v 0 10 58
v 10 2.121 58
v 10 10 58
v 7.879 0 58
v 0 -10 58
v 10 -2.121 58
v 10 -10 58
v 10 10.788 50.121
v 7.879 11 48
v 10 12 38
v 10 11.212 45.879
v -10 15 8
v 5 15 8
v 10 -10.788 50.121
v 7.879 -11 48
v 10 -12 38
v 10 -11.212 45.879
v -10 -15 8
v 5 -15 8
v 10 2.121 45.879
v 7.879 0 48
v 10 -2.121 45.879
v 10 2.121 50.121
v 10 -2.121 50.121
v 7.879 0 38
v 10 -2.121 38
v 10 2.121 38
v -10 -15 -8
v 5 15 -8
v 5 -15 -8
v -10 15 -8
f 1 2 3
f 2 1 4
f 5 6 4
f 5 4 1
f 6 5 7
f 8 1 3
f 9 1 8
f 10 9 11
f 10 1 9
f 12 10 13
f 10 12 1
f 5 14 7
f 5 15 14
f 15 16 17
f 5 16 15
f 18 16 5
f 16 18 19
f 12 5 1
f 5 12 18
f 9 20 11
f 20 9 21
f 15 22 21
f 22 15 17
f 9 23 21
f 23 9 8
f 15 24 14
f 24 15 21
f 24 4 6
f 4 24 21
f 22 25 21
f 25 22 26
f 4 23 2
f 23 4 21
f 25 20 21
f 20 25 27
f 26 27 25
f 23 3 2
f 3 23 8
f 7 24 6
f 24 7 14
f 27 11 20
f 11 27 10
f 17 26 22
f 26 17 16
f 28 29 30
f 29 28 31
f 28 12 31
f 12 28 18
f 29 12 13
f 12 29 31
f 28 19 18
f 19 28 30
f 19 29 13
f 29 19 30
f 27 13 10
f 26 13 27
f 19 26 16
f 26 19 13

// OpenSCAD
// file: auxiliery_models.scad
$fn = 40;

// usefull modules

//cloning mirror
module mirror2(v) {
    children();
    mirror(v) children();
}


// hole for vertical printing (no suppurt)
module smart_hole(d = 10, h = 10, center = true, bridging = true) {
    difference() {
        union() {
            rotate([0,90,0])
                cylinder(d = d, h = h, center = center);
            translate([0,0,sqrt(2*d*d)/4])
                rotate([45,0,0])
                cube([h,d/2,d/2], center = center);
        }
        if(bridging)
            translate([0,0,d])
                cube([h+1,d,d], center = center);
    }
}

// for angled screw head 
// sh_d = screw head diameter
module smart_screw_hole(d = 3.2, h = 20, sh_d = 7, sh_h = 4, center = true, bridging = true) {
    smart_hole(d=d, h=h, center = center, bridging = bridging);
    translate([-h/2,0,])
        rotate([0,90,0])
        rotate_extrude(angle = 360)
        polygon([[d/2, sh_h],[ sh_d/2,0], [d/2,0], [d/2 - 2, 0], [d/2 - 2, sh_h]]);
}

function pulley_d_calc(teeth) = (2*((teeth*2)/(3.14159265*2)-0.254));

module pulley(teeth = 40, h = 12, sides = 0) {
    additional_tooth_width = 0.2; //mm
    additional_tooth_depth = 0.2; //mm

    
    pulley_OD = pulley_d_calc(teeth);
    tooth_depth = 0.764;
    tooth_width = 1.494;
    
	tooth_distance_from_centre = sqrt( pow(pulley_OD/2,2) - pow((tooth_width+additional_tooth_width)/2,2));
	tooth_width_scale = (tooth_width + additional_tooth_width ) / tooth_width;
	tooth_depth_scale = ((tooth_depth + additional_tooth_depth ) / tooth_depth) ;

    module GT2_2mm() {
        linear_extrude(height=h+2) polygon([[0.747183,-0.5],[0.747183,0],[0.647876,0.037218],
        [0.598311,0.130528],[0.578556,0.238423],[0.547158,0.343077],[0.504649,0.443762],[0.451556,0.53975],
        [0.358229,0.636924],[0.2484,0.707276],[0.127259,0.750044],[0,0.76447],[-0.127259,0.750044],
        [-0.2484,0.707276],[-0.358229,0.636924],[-0.451556,0.53975],[-0.504797,0.443762],[-0.547291,0.343077],
        [-0.578605,0.238423],[-0.598311,0.130528],[-0.648009,0.037218],[-0.747183,0],[-0.747183,-0.5]]);
    }   

	difference() {	
		rotate ([0,0,360/(teeth*4)]) 
		cylinder(r=pulley_OD/2,h=h, $fn=teeth*4);
	
		//teeth - cut out of shaft
		
		for(i=[1:teeth]) 
        rotate([0,0,i*(360/teeth)]) 
        translate([0,-tooth_distance_from_centre,-1]) 
        scale ([ tooth_width_scale , tooth_depth_scale , 1 ]) 
        {
         GT2_2mm();
        }
	}	
    if ( sides > 0 ) {
        translate ([0,0, h - sides]) 
        rotate_extrude($fn=teeth*4)  
        polygon([[0,0],[pulley_OD/2,0],[pulley_OD/2 + sides , sides],[0 , sides],[0,0]]);
    }
		
    if ( sides > 0 ) {
        translate ([0,0,0 ]) 
        rotate_extrude($fn=teeth*4)  
        polygon([[0,0],[pulley_OD/2 + sides,0],[pulley_OD/2 , sides],[0 , sides],[0,0]]);
    } 
}

module belt_connector_round(teeth = 40, h = 8, belt_thick = 1, wall_thick = 5, wall_ang = 90, outer_d = 40) {
    pulley(teeth = 40, h = 8);
    
    wall_inner_r = pulley_d_calc(teeth) / 2 + belt_thick;
    
    if(outer_d / 2 - wall_inner_r > wall_thick) 
    {  
        echo("here");
        wall_center_r = (pulley_d_calc(teeth) + outer_d / 2 - wall_inner_r) / 2 + belt_thick;
        
        rotate_extrude(angle = wall_ang)
        translate([wall_center_r,h / 2,0])
        square([outer_d / 2 - wall_inner_r, h], center = true);
    } else {  
        wall_center_r = (pulley_d_calc(teeth) + wall_thick) / 2 + belt_thick;
        
        rotate_extrude(angle = wall_ang)
        translate([wall_center_r,h / 2,0])
        square([wall_thick, h], center = true);
    }
}

module motor_s_cutout(screw_l = 3) {
	//todo get dimension
	motor_w = 12;
	motor_d = 10;
	gear_h = 8; // get real
	motor_h = 15.2 + gear_h + 5;

	shaft_d = 4;
	shaft_l = screw_l;
	
	//ssrews
	screws_cnt = 2;
	screw_offset = 9 / 2;  
	screw_d = 1.6;
	screw_top_d = 2.4;
	screw_top_off = (screw_d - screw_top_d) / 2;

	translate([0, 0, - motor_h / 2])
		cube([motor_w, motor_d, motor_h], center = true);
	translate([0, 0, + shaft_l / 2])
		cylinder(d = shaft_d, h = shaft_l, center = true);
	mirror2([1,0,0])
		translate([screw_offset, 0, + screw_l / 2]) {
			cylinder(d = screw_d, h = screw_l, center = true);

			rotate_extrude()
				polygon([[screw_d / 2	 , screw_l / 2],
						 [screw_top_d / 2, screw_l / 2],
						 [screw_d / 2	 , screw_l / 2 + screw_top_off]]);
			}
}

motor_s_cutout();

module motor_m_cutout() {

}

module motor_l_cutout() {

}

/*
difference() {
    union() {
        pulley(teeth = 20, h = 10, sides = 2);
        translate([0,0,-3])
            cylinder(h = 6, d = pulley_d_calc(20) + 4, center = true, $fn = 20 * 4);
        translate([0,0,10.5])
            cylinder(h = 1, d = pulley_d_calc(20) + 4, center = true, $fn = 20 * 4);
    }
    
    cylinder(d = 4.5, h = 30, center = true);
    translate([0, 4.2, -3])
        cube([6, 3, 7], center = true);
    translate([0, 10, -3])
        rotate([90,00,0])
            cylinder(h = 20, d = 3.2, center = true);
}
*/

/*translate([0, 0, 0])
    cube([40,40,5], center = true);
rotate([0,0,135])
    belt_connector_round();
*/
/*
difference() {
    union() {
        translate([-200/2, 0, -2.5])
            cube([200,30,5], center = true);
        translate([0,0,-2.5])
            cylinder(h = 5, d = 30, center = true);
        translate([-200,0,-2.5])
            cylinder(h = 5, d = 30, center = true);
        rotate([0,0,135])
            belt_connector_round();
    }
   
    cylinder(h = 20, d = 8, center = true);
    translate([-50, 0, -2.5])
        cylinder(h = 20, d = 8, center = true);
    translate([-100, 0, -2.5])
        cylinder(h = 20, d = 8, center = true);
    translate([-150, 0, -2.5])
        cylinder(h = 20, d = 8, center = true);
    translate([-200, 0, -2.5])
        cylinder(h = 20, d = 8, center = true);
}*/
/*
//smart_hole();
difference() {
    cube([30,60,60], center = true);
    smart_screw_hole(d = 30, h = 30, sh_d = 40, sh_h = 5);
    
}*/
// main file
use <auxiliery_models.scad> 

nut_M4_w = 7;
nut_M4_h = 3;
nut_M4_d = 8;

module body() {
	

}

module finger() {
	finger_h = 50;
	finger_d = 20;
	finger_w = 30;
	
	base_h = 16;
	base_d = 15;

	top_h = 20;
	top_d = 10;
	top_w = 20;
	
	grip_cut_side = 3;

	//modules
	module base_cutout() {
		translate([finger_d / 2, 0, -base_h / 2])
			rotate([90,-90,0])
			linear_extrude(50, center = true)
			polygon([[0,-1], [0, finger_d - base_d], 
					[base_h, finger_d - base_d], 
					[base_h + finger_h - top_h, 0],
					[base_h + finger_h - top_h, -1]]);

	}

	module top_cutouts() {
		// side cuts
		mirror2([0,1,0])
			translate([0, finger_w/2, finger_h + base_h / 2])
			rotate([90,-90,90])
			linear_extrude(50, center = true)
			polygon([[0,-1],
					[0, (finger_w - top_w) / 2], 
					[0 - finger_h, 0], 
					[0 - finger_h, -1]]
					);
		// back cut
		translate([-finger_d/2, 0, finger_h + base_h / 2])
			rotate([90,-90,-180])
			linear_extrude(50, center = true)
			polygon([[0,-1],
					[0, finger_d - top_d], 
					[0 - finger_h, 0], 
					[0 - finger_h, -1]]
					);
	}
	
	module grip_cutouts() {
		translate([finger_d /2, 0, finger_h + base_h / 2 - (top_w / 2)]) {
			rotate([0,45,0])
				cube([grip_cut_side, finger_w, grip_cut_side], center = true);
			rotate([0,0,45])
				cube([grip_cut_side, grip_cut_side, top_h], center = true);
		}
	}

	// model itself
	difference() {
		//baiic cube
		translate([0, 0, finger_h /2])
			cube([finger_d, finger_w, finger_h + base_h], center = true);
		base_cutout();
		top_cutouts();
		grip_cutouts();
	}
}

finger();
